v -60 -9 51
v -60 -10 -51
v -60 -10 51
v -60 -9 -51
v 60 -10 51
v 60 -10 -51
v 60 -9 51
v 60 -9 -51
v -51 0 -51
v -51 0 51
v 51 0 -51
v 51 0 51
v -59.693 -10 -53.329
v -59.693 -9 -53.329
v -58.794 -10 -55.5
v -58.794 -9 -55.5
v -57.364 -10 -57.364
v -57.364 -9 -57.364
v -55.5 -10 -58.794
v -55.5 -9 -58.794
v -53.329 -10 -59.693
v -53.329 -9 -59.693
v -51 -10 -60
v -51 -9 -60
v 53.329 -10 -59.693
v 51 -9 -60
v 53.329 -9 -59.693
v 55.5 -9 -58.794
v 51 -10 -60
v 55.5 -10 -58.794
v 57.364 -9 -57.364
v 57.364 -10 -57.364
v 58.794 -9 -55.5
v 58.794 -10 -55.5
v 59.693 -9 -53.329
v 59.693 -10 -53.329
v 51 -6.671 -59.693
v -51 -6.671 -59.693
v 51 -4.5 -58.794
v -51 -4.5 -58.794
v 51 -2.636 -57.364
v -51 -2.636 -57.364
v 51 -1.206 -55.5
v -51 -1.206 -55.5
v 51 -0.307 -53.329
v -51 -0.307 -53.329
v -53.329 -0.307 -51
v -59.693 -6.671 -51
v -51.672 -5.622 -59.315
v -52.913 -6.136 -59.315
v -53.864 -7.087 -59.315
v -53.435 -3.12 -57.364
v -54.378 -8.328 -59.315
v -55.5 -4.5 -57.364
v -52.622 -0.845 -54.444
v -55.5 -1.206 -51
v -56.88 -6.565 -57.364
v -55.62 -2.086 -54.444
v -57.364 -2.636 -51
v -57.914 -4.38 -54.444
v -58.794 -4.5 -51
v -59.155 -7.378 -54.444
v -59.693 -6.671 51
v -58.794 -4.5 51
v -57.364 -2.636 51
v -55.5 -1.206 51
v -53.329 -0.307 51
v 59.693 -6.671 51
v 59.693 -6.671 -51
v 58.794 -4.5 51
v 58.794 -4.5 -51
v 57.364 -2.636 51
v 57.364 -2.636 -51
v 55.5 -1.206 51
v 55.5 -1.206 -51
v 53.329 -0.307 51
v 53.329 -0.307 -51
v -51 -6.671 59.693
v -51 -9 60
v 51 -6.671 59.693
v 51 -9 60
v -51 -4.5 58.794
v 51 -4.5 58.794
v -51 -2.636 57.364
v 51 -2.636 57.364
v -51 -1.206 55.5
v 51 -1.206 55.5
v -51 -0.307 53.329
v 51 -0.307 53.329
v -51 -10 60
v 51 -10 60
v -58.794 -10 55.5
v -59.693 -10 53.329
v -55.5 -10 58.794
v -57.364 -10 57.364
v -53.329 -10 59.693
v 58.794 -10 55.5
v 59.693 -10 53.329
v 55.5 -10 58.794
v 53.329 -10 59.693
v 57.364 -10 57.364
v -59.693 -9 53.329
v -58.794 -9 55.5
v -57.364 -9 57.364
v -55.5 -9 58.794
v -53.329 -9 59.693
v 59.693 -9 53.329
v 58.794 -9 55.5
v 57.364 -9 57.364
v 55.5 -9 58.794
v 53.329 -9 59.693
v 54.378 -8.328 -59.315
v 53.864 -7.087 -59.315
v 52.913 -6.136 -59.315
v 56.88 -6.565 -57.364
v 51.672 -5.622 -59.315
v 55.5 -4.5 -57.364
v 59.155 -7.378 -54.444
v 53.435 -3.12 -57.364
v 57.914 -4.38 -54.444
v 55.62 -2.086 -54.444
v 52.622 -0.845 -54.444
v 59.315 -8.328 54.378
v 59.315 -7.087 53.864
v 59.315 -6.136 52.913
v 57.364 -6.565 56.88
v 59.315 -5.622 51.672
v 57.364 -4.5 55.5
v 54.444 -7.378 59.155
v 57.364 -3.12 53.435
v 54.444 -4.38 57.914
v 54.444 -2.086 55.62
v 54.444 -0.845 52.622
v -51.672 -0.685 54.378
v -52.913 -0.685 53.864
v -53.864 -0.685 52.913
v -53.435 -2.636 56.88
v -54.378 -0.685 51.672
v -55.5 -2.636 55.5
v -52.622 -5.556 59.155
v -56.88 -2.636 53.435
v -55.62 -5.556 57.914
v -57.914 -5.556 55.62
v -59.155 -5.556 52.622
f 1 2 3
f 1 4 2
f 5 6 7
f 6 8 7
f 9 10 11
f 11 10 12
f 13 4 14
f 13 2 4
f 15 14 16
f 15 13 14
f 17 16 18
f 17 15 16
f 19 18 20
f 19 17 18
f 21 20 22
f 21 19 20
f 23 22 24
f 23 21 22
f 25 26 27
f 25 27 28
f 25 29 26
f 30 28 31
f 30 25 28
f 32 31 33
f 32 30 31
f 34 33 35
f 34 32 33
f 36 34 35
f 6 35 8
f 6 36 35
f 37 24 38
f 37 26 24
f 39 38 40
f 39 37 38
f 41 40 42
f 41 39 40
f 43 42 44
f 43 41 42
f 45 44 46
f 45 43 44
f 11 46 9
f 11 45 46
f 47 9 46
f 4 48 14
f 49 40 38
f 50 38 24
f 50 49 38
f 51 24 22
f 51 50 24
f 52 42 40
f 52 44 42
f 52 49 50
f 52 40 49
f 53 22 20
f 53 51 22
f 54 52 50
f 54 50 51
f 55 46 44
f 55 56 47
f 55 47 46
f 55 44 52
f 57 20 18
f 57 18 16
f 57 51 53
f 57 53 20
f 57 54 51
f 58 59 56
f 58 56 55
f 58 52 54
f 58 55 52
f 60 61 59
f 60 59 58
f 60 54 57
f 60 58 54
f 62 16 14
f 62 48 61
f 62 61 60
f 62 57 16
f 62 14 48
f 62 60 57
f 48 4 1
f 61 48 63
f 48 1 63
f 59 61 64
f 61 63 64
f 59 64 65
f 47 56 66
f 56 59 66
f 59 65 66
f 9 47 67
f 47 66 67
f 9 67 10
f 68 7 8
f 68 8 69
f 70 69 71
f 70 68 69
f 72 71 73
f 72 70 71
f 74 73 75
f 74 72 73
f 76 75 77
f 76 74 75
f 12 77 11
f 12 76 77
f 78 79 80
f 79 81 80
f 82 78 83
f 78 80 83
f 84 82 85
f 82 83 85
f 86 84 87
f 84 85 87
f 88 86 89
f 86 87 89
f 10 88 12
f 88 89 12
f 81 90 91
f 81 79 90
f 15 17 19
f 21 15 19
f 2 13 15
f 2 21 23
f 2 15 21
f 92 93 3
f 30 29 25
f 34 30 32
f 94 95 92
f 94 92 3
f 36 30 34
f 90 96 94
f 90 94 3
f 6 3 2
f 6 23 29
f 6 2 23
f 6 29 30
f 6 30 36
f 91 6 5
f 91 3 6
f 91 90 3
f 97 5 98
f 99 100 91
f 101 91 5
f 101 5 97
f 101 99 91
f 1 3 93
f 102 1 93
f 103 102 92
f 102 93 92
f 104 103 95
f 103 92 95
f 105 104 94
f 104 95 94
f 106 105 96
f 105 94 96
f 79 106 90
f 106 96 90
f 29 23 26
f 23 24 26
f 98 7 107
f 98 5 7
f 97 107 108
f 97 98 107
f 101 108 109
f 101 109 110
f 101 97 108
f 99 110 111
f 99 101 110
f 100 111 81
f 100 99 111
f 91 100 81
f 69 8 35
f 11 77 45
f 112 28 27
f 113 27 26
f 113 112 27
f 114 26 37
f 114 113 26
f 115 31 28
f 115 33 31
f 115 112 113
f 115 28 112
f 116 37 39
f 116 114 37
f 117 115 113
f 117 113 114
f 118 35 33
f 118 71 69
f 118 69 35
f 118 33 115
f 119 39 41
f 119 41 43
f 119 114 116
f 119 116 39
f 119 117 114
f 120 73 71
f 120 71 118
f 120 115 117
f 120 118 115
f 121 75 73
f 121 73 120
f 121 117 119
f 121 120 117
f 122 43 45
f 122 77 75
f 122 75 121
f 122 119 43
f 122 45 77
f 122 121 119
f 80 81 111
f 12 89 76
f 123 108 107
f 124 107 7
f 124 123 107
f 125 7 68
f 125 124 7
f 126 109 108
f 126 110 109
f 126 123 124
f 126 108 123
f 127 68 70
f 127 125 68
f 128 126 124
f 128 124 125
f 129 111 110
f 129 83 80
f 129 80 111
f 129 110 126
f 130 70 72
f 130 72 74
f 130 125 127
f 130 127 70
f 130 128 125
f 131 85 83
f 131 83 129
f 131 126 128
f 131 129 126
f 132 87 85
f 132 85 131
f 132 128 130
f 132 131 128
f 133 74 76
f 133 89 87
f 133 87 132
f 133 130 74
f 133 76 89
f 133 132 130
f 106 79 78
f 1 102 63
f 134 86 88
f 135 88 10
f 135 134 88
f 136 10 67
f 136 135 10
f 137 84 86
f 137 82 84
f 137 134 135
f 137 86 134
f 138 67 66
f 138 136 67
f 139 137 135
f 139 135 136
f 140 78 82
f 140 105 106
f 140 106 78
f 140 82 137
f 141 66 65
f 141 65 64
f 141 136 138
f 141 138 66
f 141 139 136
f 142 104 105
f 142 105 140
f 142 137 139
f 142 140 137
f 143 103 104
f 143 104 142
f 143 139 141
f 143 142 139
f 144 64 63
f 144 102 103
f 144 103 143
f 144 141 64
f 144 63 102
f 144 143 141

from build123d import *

# Parameters (mm, degrees)
SKETCH_W  = 120
SKETCH_H  = 120
PAD_DEPTH = 10
FILLET_R  = 9


with BuildPart() as part:
    # Sketch → Pad (new body)
    with BuildSketch(Plane.XZ):
        Rectangle(SKETCH_W, SKETCH_H)
    extrude(amount=PAD_DEPTH)

    # Fillet
    fillet_edges = [part.edges().sort_by_distance(p)[0] for p in [
        (-60, -5, 60),
        (0, 0, 60),
        (-60, 0, 0),
        (60, -5, 60),
        (60, 0, 0),
        (60, -5, -60),
        (0, 0, -60),
        (-60, -5, -60),
    ]]
    fillet(fillet_edges, radius=FILLET_R)


solid = part.part
